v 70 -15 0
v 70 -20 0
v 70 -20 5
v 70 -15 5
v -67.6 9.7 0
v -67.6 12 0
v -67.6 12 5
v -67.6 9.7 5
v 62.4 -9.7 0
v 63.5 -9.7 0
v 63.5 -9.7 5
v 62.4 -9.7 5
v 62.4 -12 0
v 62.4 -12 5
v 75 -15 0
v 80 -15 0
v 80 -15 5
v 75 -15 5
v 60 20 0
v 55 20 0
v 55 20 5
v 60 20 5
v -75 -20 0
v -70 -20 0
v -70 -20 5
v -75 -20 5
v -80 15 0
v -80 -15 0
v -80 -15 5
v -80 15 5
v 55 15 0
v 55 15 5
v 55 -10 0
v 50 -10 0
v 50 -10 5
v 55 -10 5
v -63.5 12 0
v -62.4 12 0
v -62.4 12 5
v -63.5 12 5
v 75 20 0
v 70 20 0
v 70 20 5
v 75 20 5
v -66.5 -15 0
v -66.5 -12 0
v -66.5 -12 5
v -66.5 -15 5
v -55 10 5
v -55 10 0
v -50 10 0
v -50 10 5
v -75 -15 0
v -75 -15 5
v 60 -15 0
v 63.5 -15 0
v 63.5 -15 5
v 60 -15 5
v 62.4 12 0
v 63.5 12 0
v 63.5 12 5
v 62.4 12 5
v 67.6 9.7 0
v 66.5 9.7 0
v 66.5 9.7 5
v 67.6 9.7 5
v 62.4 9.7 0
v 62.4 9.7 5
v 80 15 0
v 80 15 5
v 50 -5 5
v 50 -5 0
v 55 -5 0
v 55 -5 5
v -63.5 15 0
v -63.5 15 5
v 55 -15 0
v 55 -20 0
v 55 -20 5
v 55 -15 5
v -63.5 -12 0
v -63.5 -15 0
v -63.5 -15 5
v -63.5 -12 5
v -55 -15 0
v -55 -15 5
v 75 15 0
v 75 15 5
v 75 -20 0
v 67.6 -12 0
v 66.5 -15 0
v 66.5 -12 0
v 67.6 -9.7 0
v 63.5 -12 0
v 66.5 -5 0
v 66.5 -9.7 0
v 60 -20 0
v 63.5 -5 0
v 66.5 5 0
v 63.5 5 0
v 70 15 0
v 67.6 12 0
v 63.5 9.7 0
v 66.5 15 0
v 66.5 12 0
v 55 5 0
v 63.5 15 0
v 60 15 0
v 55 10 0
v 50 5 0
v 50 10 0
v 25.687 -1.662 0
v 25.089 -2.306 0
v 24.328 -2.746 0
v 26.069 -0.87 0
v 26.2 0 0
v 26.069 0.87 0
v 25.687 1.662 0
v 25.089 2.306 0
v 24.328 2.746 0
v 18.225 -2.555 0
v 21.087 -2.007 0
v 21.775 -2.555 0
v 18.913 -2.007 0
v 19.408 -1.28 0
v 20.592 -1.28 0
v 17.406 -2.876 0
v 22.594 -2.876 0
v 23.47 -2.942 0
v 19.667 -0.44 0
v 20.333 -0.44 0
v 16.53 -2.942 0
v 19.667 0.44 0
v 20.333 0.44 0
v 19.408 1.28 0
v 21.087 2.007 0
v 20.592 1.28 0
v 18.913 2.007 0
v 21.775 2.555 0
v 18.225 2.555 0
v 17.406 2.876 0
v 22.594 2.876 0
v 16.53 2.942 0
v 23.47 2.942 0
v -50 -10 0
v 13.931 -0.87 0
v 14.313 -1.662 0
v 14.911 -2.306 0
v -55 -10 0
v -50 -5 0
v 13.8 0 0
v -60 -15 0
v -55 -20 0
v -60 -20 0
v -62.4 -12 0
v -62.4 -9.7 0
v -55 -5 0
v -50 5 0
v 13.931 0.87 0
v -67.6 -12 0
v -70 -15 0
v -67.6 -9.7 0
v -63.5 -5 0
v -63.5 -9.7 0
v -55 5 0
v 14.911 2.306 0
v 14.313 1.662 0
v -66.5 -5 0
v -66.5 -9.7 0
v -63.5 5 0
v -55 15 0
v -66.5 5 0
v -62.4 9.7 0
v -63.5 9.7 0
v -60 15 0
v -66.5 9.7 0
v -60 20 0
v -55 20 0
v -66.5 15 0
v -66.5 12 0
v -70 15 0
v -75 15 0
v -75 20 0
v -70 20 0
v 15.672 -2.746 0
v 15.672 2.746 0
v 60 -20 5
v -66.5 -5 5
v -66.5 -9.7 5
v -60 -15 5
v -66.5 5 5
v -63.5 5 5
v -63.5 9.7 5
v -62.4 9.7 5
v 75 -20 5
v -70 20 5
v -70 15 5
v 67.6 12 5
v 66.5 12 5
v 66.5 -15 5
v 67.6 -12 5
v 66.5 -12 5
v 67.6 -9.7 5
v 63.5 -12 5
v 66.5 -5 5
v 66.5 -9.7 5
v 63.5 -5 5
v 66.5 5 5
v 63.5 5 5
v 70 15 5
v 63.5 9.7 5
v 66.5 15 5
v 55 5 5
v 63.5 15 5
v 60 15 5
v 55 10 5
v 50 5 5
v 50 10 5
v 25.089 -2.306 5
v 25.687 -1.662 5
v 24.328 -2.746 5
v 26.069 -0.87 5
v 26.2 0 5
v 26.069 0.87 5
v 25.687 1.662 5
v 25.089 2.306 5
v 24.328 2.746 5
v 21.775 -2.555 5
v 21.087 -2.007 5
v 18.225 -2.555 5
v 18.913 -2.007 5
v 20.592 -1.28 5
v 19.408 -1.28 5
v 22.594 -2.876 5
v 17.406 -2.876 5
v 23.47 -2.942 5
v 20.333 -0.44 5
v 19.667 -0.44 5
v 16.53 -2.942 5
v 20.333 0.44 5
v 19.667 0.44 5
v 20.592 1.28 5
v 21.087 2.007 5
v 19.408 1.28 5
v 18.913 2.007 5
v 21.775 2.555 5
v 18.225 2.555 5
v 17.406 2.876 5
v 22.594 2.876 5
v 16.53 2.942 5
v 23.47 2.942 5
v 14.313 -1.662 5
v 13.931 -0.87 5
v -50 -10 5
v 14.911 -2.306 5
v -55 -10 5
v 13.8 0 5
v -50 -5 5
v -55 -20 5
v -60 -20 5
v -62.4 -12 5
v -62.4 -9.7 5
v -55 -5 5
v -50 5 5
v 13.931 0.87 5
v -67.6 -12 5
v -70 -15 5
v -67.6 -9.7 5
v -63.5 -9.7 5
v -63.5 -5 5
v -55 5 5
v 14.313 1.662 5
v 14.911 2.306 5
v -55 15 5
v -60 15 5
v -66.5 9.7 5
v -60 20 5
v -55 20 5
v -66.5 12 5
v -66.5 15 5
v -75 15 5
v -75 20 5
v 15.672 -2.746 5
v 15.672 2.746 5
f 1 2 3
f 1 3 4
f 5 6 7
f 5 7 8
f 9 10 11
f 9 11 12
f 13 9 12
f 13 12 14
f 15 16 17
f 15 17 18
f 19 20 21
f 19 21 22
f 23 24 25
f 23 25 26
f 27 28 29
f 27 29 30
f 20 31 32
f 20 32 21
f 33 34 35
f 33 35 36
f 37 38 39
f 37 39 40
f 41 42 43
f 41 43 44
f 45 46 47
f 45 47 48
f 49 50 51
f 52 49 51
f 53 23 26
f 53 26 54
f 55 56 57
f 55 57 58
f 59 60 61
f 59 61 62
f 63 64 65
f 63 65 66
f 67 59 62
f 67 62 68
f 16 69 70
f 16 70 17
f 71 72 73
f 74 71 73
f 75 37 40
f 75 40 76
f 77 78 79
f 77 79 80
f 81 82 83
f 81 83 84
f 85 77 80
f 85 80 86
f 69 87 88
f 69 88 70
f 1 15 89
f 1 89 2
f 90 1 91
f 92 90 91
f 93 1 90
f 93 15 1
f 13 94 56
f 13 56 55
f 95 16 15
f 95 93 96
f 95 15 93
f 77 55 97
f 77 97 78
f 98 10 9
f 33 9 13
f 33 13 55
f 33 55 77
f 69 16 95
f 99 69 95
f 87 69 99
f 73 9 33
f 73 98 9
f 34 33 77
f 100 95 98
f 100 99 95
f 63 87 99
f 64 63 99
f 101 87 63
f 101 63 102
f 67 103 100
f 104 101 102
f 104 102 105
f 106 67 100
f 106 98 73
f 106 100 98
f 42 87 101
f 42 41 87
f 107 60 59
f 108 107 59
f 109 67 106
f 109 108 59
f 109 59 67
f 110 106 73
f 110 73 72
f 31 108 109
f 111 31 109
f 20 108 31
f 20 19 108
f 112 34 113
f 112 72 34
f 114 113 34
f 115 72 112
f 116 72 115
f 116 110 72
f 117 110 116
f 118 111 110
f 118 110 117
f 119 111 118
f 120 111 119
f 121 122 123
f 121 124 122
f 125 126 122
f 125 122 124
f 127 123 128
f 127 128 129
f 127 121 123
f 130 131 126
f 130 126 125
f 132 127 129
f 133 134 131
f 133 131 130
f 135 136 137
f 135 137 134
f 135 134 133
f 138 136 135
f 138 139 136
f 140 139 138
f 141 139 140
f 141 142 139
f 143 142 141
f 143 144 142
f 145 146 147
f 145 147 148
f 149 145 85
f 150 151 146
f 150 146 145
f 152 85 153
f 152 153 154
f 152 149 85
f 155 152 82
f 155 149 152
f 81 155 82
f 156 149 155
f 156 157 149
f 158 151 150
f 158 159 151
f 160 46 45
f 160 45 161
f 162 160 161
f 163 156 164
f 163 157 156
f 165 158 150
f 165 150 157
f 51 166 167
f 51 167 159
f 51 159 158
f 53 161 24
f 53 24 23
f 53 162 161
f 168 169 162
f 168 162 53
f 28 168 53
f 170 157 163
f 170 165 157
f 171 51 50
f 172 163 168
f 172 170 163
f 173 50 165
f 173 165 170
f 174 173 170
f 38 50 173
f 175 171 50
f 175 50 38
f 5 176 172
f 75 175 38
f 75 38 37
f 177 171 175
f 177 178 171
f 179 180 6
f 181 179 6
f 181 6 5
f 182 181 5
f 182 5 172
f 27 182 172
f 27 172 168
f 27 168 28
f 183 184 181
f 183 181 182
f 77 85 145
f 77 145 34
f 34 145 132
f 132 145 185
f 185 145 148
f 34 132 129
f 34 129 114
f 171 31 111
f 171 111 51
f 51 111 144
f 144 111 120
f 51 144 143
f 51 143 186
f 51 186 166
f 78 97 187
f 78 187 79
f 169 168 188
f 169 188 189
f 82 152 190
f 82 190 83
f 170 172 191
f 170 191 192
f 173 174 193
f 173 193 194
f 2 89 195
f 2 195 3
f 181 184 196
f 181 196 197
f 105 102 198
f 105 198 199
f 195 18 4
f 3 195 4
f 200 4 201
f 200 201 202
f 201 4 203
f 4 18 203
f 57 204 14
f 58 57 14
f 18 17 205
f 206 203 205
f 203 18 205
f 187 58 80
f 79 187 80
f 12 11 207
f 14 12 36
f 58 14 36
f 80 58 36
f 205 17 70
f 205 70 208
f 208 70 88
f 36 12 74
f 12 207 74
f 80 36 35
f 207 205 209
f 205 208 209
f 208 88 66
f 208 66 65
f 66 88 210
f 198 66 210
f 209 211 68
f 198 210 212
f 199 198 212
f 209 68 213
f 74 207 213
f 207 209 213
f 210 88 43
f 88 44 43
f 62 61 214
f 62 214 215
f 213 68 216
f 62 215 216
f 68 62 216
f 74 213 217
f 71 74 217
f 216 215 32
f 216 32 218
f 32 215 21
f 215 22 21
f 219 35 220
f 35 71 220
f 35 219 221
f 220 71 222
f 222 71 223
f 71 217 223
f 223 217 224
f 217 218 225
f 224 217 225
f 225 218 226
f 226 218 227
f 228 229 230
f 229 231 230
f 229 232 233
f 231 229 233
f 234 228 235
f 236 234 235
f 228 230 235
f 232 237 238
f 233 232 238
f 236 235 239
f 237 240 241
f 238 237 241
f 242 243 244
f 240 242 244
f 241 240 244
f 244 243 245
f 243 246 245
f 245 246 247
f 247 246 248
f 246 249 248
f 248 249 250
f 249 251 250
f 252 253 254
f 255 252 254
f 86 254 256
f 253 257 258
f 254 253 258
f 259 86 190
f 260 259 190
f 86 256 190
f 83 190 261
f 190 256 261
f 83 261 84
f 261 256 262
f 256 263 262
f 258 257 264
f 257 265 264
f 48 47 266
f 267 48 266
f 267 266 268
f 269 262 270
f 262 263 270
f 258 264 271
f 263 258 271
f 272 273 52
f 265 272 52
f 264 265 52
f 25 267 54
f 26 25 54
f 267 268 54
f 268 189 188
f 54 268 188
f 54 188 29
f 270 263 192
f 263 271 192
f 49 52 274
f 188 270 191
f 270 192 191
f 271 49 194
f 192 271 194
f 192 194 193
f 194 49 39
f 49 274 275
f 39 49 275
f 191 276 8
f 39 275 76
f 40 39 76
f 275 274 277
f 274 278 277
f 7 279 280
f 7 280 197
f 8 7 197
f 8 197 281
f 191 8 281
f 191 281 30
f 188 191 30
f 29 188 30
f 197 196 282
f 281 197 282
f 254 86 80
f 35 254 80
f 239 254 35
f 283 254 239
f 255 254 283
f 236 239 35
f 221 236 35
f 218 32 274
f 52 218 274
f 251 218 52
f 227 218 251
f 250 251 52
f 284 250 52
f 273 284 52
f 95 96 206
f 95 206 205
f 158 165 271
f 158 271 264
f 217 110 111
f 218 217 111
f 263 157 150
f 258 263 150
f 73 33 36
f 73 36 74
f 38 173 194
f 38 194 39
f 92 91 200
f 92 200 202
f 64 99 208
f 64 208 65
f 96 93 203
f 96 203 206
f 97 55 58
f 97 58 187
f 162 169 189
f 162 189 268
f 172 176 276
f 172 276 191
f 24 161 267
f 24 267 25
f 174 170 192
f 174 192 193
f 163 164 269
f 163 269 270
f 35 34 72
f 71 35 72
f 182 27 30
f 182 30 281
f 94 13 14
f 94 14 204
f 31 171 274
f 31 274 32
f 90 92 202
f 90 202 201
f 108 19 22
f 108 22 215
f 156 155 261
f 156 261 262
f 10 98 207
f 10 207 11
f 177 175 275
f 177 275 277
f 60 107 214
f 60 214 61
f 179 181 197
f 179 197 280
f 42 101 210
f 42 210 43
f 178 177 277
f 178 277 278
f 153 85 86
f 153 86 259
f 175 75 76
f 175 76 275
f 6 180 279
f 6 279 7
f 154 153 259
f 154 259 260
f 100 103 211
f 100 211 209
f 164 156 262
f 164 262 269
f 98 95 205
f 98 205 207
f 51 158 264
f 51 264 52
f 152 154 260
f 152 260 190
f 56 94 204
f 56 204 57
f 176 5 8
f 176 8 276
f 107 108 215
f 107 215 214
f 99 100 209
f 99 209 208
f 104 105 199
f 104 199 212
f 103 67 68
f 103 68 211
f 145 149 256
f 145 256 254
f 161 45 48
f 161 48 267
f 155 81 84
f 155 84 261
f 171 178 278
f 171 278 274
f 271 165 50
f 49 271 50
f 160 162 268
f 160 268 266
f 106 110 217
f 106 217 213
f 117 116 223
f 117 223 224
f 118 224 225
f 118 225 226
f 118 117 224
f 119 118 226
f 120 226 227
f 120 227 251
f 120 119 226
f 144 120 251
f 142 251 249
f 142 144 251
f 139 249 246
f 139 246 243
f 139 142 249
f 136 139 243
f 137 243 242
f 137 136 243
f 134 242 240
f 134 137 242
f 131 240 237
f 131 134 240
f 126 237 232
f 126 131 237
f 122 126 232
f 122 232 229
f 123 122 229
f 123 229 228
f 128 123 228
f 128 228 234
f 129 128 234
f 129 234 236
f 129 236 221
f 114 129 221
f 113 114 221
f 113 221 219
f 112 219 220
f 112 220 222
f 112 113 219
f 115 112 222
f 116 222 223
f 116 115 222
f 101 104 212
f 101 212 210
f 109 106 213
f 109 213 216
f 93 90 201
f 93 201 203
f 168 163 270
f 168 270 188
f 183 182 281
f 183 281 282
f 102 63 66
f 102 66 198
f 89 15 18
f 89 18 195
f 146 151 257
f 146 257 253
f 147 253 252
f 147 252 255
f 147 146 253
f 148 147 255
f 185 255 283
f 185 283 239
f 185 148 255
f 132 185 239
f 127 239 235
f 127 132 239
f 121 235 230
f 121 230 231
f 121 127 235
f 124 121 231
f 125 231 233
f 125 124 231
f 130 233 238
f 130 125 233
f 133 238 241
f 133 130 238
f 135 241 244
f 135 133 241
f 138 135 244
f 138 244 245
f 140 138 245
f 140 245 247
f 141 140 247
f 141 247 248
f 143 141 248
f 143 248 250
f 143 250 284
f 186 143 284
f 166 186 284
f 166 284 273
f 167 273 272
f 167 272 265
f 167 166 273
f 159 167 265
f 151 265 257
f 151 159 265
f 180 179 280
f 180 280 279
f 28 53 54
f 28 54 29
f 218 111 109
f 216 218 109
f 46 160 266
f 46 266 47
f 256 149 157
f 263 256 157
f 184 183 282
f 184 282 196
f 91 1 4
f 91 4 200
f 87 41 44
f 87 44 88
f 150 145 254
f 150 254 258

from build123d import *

# Parameters (mm, degrees)
SKETCH2_R           = 2.95
SKETCH2_W           = 5
SKETCH2_H           = 5
BOSS_EXTRUDE1_DEPTH = 5


with BuildPart() as part:
    # Sketch2 → Boss-Extrude1 (new body)
    with BuildSketch(Plane.XY):
        Polygon((66.5, 15), (70, 15), (70, 20), (75, 20), (75, 15), (80, 15), (80, -15), (75, -15), (75, -20), (70, -20), (70, -15), (66.5, -15), (66.5, -12), (67.6, -12), (67.6, -9.7), (66.5, -9.7), (66.5, -5), (63.5, -5), (63.5, -9.7), (62.4, -9.7), (62.4, -12), (63.5, -12), (63.5, -15), (60, -15), (60, -20), (55, -20), (55, -15), (-55, -15), (-55, -20), (-60, -20), (-60, -15), (-63.5, -15), (-63.5, -12), (-62.4, -12), (-62.4, -9.7), (-63.5, -9.7), (-63.5, -5), (-66.5, -5), (-66.5, -9.7), (-67.6, -9.7), (-67.6, -12), (-66.5, -12), (-66.5, -15), (-70, -15), (-70, -20), (-75, -20), (-75, -15), (-80, -15), (-80, 15), (-75, 15), (-75, 20), (-70, 20), (-70, 15), (-66.5, 15), (-66.5, 12), (-67.6, 12), (-67.6, 9.7), (-66.5, 9.7), (-66.5, 5), (-63.5, 5), (-63.5, 9.7), (-62.4, 9.7), (-62.4, 12), (-63.5, 12), (-63.5, 15), (-60, 15), (-60, 20), (-55, 20), (-55, 15), (55, 15), (55, 20), (60, 20), (60, 15), (63.5, 15), (63.5, 12), (62.4, 12), (62.4, 9.7), (63.5, 9.7), (63.5, 5), (66.5, 5), (66.5, 9.7), (67.6, 9.7), (67.6, 12), (66.5, 12), align=None)
        with Locations((23.25, 0)):
            Circle(SKETCH2_R, mode=Mode.SUBTRACT)
        with Locations(Location((16.75, 0, 0), (0, 0, 180))):
            Circle(SKETCH2_R, mode=Mode.SUBTRACT)
        with Locations((52.5, 7.5)):
            Rectangle(SKETCH2_W, SKETCH2_H, mode=Mode.SUBTRACT)
        with Locations((52.5, -7.5)):
            Rectangle(SKETCH2_W, SKETCH2_H, mode=Mode.SUBTRACT)
        with Locations((-52.5, 7.5)):
            Rectangle(SKETCH2_W, SKETCH2_H, mode=Mode.SUBTRACT)
        with Locations((-52.5, -7.5)):
            Rectangle(SKETCH2_W, SKETCH2_H, mode=Mode.SUBTRACT)
    extrude(amount=BOSS_EXTRUDE1_DEPTH)


solid = part.part
